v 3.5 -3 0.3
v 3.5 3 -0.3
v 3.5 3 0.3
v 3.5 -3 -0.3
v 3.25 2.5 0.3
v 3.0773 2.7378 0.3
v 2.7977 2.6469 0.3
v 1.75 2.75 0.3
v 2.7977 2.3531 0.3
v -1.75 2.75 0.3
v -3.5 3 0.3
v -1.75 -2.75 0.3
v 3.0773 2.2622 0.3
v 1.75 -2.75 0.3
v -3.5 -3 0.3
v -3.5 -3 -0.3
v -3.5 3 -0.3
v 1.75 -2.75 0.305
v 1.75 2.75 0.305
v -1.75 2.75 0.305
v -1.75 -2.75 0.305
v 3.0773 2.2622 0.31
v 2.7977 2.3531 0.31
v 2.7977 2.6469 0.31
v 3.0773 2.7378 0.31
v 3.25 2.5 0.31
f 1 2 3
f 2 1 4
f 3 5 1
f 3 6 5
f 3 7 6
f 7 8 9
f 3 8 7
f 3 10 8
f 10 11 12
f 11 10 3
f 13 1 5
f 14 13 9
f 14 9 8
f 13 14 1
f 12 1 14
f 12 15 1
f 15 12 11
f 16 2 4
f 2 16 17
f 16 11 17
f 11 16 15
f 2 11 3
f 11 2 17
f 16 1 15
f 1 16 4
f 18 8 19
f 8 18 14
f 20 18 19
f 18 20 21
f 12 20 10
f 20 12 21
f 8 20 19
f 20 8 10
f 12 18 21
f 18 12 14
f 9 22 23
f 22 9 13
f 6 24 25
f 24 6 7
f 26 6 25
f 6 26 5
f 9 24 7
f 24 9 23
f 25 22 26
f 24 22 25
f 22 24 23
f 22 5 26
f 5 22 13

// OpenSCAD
union() {
    color("#505050") cube([7, 6, 0.6], center=true);
    color("#a0a0a0") translate([0,0,0.3]) cube([3.5, 5.5, 0.01], center=true);
    color("#a0a0a0") translate([3,2.5,0.3]) cylinder(d=0.5, h=0.01);
}
    
